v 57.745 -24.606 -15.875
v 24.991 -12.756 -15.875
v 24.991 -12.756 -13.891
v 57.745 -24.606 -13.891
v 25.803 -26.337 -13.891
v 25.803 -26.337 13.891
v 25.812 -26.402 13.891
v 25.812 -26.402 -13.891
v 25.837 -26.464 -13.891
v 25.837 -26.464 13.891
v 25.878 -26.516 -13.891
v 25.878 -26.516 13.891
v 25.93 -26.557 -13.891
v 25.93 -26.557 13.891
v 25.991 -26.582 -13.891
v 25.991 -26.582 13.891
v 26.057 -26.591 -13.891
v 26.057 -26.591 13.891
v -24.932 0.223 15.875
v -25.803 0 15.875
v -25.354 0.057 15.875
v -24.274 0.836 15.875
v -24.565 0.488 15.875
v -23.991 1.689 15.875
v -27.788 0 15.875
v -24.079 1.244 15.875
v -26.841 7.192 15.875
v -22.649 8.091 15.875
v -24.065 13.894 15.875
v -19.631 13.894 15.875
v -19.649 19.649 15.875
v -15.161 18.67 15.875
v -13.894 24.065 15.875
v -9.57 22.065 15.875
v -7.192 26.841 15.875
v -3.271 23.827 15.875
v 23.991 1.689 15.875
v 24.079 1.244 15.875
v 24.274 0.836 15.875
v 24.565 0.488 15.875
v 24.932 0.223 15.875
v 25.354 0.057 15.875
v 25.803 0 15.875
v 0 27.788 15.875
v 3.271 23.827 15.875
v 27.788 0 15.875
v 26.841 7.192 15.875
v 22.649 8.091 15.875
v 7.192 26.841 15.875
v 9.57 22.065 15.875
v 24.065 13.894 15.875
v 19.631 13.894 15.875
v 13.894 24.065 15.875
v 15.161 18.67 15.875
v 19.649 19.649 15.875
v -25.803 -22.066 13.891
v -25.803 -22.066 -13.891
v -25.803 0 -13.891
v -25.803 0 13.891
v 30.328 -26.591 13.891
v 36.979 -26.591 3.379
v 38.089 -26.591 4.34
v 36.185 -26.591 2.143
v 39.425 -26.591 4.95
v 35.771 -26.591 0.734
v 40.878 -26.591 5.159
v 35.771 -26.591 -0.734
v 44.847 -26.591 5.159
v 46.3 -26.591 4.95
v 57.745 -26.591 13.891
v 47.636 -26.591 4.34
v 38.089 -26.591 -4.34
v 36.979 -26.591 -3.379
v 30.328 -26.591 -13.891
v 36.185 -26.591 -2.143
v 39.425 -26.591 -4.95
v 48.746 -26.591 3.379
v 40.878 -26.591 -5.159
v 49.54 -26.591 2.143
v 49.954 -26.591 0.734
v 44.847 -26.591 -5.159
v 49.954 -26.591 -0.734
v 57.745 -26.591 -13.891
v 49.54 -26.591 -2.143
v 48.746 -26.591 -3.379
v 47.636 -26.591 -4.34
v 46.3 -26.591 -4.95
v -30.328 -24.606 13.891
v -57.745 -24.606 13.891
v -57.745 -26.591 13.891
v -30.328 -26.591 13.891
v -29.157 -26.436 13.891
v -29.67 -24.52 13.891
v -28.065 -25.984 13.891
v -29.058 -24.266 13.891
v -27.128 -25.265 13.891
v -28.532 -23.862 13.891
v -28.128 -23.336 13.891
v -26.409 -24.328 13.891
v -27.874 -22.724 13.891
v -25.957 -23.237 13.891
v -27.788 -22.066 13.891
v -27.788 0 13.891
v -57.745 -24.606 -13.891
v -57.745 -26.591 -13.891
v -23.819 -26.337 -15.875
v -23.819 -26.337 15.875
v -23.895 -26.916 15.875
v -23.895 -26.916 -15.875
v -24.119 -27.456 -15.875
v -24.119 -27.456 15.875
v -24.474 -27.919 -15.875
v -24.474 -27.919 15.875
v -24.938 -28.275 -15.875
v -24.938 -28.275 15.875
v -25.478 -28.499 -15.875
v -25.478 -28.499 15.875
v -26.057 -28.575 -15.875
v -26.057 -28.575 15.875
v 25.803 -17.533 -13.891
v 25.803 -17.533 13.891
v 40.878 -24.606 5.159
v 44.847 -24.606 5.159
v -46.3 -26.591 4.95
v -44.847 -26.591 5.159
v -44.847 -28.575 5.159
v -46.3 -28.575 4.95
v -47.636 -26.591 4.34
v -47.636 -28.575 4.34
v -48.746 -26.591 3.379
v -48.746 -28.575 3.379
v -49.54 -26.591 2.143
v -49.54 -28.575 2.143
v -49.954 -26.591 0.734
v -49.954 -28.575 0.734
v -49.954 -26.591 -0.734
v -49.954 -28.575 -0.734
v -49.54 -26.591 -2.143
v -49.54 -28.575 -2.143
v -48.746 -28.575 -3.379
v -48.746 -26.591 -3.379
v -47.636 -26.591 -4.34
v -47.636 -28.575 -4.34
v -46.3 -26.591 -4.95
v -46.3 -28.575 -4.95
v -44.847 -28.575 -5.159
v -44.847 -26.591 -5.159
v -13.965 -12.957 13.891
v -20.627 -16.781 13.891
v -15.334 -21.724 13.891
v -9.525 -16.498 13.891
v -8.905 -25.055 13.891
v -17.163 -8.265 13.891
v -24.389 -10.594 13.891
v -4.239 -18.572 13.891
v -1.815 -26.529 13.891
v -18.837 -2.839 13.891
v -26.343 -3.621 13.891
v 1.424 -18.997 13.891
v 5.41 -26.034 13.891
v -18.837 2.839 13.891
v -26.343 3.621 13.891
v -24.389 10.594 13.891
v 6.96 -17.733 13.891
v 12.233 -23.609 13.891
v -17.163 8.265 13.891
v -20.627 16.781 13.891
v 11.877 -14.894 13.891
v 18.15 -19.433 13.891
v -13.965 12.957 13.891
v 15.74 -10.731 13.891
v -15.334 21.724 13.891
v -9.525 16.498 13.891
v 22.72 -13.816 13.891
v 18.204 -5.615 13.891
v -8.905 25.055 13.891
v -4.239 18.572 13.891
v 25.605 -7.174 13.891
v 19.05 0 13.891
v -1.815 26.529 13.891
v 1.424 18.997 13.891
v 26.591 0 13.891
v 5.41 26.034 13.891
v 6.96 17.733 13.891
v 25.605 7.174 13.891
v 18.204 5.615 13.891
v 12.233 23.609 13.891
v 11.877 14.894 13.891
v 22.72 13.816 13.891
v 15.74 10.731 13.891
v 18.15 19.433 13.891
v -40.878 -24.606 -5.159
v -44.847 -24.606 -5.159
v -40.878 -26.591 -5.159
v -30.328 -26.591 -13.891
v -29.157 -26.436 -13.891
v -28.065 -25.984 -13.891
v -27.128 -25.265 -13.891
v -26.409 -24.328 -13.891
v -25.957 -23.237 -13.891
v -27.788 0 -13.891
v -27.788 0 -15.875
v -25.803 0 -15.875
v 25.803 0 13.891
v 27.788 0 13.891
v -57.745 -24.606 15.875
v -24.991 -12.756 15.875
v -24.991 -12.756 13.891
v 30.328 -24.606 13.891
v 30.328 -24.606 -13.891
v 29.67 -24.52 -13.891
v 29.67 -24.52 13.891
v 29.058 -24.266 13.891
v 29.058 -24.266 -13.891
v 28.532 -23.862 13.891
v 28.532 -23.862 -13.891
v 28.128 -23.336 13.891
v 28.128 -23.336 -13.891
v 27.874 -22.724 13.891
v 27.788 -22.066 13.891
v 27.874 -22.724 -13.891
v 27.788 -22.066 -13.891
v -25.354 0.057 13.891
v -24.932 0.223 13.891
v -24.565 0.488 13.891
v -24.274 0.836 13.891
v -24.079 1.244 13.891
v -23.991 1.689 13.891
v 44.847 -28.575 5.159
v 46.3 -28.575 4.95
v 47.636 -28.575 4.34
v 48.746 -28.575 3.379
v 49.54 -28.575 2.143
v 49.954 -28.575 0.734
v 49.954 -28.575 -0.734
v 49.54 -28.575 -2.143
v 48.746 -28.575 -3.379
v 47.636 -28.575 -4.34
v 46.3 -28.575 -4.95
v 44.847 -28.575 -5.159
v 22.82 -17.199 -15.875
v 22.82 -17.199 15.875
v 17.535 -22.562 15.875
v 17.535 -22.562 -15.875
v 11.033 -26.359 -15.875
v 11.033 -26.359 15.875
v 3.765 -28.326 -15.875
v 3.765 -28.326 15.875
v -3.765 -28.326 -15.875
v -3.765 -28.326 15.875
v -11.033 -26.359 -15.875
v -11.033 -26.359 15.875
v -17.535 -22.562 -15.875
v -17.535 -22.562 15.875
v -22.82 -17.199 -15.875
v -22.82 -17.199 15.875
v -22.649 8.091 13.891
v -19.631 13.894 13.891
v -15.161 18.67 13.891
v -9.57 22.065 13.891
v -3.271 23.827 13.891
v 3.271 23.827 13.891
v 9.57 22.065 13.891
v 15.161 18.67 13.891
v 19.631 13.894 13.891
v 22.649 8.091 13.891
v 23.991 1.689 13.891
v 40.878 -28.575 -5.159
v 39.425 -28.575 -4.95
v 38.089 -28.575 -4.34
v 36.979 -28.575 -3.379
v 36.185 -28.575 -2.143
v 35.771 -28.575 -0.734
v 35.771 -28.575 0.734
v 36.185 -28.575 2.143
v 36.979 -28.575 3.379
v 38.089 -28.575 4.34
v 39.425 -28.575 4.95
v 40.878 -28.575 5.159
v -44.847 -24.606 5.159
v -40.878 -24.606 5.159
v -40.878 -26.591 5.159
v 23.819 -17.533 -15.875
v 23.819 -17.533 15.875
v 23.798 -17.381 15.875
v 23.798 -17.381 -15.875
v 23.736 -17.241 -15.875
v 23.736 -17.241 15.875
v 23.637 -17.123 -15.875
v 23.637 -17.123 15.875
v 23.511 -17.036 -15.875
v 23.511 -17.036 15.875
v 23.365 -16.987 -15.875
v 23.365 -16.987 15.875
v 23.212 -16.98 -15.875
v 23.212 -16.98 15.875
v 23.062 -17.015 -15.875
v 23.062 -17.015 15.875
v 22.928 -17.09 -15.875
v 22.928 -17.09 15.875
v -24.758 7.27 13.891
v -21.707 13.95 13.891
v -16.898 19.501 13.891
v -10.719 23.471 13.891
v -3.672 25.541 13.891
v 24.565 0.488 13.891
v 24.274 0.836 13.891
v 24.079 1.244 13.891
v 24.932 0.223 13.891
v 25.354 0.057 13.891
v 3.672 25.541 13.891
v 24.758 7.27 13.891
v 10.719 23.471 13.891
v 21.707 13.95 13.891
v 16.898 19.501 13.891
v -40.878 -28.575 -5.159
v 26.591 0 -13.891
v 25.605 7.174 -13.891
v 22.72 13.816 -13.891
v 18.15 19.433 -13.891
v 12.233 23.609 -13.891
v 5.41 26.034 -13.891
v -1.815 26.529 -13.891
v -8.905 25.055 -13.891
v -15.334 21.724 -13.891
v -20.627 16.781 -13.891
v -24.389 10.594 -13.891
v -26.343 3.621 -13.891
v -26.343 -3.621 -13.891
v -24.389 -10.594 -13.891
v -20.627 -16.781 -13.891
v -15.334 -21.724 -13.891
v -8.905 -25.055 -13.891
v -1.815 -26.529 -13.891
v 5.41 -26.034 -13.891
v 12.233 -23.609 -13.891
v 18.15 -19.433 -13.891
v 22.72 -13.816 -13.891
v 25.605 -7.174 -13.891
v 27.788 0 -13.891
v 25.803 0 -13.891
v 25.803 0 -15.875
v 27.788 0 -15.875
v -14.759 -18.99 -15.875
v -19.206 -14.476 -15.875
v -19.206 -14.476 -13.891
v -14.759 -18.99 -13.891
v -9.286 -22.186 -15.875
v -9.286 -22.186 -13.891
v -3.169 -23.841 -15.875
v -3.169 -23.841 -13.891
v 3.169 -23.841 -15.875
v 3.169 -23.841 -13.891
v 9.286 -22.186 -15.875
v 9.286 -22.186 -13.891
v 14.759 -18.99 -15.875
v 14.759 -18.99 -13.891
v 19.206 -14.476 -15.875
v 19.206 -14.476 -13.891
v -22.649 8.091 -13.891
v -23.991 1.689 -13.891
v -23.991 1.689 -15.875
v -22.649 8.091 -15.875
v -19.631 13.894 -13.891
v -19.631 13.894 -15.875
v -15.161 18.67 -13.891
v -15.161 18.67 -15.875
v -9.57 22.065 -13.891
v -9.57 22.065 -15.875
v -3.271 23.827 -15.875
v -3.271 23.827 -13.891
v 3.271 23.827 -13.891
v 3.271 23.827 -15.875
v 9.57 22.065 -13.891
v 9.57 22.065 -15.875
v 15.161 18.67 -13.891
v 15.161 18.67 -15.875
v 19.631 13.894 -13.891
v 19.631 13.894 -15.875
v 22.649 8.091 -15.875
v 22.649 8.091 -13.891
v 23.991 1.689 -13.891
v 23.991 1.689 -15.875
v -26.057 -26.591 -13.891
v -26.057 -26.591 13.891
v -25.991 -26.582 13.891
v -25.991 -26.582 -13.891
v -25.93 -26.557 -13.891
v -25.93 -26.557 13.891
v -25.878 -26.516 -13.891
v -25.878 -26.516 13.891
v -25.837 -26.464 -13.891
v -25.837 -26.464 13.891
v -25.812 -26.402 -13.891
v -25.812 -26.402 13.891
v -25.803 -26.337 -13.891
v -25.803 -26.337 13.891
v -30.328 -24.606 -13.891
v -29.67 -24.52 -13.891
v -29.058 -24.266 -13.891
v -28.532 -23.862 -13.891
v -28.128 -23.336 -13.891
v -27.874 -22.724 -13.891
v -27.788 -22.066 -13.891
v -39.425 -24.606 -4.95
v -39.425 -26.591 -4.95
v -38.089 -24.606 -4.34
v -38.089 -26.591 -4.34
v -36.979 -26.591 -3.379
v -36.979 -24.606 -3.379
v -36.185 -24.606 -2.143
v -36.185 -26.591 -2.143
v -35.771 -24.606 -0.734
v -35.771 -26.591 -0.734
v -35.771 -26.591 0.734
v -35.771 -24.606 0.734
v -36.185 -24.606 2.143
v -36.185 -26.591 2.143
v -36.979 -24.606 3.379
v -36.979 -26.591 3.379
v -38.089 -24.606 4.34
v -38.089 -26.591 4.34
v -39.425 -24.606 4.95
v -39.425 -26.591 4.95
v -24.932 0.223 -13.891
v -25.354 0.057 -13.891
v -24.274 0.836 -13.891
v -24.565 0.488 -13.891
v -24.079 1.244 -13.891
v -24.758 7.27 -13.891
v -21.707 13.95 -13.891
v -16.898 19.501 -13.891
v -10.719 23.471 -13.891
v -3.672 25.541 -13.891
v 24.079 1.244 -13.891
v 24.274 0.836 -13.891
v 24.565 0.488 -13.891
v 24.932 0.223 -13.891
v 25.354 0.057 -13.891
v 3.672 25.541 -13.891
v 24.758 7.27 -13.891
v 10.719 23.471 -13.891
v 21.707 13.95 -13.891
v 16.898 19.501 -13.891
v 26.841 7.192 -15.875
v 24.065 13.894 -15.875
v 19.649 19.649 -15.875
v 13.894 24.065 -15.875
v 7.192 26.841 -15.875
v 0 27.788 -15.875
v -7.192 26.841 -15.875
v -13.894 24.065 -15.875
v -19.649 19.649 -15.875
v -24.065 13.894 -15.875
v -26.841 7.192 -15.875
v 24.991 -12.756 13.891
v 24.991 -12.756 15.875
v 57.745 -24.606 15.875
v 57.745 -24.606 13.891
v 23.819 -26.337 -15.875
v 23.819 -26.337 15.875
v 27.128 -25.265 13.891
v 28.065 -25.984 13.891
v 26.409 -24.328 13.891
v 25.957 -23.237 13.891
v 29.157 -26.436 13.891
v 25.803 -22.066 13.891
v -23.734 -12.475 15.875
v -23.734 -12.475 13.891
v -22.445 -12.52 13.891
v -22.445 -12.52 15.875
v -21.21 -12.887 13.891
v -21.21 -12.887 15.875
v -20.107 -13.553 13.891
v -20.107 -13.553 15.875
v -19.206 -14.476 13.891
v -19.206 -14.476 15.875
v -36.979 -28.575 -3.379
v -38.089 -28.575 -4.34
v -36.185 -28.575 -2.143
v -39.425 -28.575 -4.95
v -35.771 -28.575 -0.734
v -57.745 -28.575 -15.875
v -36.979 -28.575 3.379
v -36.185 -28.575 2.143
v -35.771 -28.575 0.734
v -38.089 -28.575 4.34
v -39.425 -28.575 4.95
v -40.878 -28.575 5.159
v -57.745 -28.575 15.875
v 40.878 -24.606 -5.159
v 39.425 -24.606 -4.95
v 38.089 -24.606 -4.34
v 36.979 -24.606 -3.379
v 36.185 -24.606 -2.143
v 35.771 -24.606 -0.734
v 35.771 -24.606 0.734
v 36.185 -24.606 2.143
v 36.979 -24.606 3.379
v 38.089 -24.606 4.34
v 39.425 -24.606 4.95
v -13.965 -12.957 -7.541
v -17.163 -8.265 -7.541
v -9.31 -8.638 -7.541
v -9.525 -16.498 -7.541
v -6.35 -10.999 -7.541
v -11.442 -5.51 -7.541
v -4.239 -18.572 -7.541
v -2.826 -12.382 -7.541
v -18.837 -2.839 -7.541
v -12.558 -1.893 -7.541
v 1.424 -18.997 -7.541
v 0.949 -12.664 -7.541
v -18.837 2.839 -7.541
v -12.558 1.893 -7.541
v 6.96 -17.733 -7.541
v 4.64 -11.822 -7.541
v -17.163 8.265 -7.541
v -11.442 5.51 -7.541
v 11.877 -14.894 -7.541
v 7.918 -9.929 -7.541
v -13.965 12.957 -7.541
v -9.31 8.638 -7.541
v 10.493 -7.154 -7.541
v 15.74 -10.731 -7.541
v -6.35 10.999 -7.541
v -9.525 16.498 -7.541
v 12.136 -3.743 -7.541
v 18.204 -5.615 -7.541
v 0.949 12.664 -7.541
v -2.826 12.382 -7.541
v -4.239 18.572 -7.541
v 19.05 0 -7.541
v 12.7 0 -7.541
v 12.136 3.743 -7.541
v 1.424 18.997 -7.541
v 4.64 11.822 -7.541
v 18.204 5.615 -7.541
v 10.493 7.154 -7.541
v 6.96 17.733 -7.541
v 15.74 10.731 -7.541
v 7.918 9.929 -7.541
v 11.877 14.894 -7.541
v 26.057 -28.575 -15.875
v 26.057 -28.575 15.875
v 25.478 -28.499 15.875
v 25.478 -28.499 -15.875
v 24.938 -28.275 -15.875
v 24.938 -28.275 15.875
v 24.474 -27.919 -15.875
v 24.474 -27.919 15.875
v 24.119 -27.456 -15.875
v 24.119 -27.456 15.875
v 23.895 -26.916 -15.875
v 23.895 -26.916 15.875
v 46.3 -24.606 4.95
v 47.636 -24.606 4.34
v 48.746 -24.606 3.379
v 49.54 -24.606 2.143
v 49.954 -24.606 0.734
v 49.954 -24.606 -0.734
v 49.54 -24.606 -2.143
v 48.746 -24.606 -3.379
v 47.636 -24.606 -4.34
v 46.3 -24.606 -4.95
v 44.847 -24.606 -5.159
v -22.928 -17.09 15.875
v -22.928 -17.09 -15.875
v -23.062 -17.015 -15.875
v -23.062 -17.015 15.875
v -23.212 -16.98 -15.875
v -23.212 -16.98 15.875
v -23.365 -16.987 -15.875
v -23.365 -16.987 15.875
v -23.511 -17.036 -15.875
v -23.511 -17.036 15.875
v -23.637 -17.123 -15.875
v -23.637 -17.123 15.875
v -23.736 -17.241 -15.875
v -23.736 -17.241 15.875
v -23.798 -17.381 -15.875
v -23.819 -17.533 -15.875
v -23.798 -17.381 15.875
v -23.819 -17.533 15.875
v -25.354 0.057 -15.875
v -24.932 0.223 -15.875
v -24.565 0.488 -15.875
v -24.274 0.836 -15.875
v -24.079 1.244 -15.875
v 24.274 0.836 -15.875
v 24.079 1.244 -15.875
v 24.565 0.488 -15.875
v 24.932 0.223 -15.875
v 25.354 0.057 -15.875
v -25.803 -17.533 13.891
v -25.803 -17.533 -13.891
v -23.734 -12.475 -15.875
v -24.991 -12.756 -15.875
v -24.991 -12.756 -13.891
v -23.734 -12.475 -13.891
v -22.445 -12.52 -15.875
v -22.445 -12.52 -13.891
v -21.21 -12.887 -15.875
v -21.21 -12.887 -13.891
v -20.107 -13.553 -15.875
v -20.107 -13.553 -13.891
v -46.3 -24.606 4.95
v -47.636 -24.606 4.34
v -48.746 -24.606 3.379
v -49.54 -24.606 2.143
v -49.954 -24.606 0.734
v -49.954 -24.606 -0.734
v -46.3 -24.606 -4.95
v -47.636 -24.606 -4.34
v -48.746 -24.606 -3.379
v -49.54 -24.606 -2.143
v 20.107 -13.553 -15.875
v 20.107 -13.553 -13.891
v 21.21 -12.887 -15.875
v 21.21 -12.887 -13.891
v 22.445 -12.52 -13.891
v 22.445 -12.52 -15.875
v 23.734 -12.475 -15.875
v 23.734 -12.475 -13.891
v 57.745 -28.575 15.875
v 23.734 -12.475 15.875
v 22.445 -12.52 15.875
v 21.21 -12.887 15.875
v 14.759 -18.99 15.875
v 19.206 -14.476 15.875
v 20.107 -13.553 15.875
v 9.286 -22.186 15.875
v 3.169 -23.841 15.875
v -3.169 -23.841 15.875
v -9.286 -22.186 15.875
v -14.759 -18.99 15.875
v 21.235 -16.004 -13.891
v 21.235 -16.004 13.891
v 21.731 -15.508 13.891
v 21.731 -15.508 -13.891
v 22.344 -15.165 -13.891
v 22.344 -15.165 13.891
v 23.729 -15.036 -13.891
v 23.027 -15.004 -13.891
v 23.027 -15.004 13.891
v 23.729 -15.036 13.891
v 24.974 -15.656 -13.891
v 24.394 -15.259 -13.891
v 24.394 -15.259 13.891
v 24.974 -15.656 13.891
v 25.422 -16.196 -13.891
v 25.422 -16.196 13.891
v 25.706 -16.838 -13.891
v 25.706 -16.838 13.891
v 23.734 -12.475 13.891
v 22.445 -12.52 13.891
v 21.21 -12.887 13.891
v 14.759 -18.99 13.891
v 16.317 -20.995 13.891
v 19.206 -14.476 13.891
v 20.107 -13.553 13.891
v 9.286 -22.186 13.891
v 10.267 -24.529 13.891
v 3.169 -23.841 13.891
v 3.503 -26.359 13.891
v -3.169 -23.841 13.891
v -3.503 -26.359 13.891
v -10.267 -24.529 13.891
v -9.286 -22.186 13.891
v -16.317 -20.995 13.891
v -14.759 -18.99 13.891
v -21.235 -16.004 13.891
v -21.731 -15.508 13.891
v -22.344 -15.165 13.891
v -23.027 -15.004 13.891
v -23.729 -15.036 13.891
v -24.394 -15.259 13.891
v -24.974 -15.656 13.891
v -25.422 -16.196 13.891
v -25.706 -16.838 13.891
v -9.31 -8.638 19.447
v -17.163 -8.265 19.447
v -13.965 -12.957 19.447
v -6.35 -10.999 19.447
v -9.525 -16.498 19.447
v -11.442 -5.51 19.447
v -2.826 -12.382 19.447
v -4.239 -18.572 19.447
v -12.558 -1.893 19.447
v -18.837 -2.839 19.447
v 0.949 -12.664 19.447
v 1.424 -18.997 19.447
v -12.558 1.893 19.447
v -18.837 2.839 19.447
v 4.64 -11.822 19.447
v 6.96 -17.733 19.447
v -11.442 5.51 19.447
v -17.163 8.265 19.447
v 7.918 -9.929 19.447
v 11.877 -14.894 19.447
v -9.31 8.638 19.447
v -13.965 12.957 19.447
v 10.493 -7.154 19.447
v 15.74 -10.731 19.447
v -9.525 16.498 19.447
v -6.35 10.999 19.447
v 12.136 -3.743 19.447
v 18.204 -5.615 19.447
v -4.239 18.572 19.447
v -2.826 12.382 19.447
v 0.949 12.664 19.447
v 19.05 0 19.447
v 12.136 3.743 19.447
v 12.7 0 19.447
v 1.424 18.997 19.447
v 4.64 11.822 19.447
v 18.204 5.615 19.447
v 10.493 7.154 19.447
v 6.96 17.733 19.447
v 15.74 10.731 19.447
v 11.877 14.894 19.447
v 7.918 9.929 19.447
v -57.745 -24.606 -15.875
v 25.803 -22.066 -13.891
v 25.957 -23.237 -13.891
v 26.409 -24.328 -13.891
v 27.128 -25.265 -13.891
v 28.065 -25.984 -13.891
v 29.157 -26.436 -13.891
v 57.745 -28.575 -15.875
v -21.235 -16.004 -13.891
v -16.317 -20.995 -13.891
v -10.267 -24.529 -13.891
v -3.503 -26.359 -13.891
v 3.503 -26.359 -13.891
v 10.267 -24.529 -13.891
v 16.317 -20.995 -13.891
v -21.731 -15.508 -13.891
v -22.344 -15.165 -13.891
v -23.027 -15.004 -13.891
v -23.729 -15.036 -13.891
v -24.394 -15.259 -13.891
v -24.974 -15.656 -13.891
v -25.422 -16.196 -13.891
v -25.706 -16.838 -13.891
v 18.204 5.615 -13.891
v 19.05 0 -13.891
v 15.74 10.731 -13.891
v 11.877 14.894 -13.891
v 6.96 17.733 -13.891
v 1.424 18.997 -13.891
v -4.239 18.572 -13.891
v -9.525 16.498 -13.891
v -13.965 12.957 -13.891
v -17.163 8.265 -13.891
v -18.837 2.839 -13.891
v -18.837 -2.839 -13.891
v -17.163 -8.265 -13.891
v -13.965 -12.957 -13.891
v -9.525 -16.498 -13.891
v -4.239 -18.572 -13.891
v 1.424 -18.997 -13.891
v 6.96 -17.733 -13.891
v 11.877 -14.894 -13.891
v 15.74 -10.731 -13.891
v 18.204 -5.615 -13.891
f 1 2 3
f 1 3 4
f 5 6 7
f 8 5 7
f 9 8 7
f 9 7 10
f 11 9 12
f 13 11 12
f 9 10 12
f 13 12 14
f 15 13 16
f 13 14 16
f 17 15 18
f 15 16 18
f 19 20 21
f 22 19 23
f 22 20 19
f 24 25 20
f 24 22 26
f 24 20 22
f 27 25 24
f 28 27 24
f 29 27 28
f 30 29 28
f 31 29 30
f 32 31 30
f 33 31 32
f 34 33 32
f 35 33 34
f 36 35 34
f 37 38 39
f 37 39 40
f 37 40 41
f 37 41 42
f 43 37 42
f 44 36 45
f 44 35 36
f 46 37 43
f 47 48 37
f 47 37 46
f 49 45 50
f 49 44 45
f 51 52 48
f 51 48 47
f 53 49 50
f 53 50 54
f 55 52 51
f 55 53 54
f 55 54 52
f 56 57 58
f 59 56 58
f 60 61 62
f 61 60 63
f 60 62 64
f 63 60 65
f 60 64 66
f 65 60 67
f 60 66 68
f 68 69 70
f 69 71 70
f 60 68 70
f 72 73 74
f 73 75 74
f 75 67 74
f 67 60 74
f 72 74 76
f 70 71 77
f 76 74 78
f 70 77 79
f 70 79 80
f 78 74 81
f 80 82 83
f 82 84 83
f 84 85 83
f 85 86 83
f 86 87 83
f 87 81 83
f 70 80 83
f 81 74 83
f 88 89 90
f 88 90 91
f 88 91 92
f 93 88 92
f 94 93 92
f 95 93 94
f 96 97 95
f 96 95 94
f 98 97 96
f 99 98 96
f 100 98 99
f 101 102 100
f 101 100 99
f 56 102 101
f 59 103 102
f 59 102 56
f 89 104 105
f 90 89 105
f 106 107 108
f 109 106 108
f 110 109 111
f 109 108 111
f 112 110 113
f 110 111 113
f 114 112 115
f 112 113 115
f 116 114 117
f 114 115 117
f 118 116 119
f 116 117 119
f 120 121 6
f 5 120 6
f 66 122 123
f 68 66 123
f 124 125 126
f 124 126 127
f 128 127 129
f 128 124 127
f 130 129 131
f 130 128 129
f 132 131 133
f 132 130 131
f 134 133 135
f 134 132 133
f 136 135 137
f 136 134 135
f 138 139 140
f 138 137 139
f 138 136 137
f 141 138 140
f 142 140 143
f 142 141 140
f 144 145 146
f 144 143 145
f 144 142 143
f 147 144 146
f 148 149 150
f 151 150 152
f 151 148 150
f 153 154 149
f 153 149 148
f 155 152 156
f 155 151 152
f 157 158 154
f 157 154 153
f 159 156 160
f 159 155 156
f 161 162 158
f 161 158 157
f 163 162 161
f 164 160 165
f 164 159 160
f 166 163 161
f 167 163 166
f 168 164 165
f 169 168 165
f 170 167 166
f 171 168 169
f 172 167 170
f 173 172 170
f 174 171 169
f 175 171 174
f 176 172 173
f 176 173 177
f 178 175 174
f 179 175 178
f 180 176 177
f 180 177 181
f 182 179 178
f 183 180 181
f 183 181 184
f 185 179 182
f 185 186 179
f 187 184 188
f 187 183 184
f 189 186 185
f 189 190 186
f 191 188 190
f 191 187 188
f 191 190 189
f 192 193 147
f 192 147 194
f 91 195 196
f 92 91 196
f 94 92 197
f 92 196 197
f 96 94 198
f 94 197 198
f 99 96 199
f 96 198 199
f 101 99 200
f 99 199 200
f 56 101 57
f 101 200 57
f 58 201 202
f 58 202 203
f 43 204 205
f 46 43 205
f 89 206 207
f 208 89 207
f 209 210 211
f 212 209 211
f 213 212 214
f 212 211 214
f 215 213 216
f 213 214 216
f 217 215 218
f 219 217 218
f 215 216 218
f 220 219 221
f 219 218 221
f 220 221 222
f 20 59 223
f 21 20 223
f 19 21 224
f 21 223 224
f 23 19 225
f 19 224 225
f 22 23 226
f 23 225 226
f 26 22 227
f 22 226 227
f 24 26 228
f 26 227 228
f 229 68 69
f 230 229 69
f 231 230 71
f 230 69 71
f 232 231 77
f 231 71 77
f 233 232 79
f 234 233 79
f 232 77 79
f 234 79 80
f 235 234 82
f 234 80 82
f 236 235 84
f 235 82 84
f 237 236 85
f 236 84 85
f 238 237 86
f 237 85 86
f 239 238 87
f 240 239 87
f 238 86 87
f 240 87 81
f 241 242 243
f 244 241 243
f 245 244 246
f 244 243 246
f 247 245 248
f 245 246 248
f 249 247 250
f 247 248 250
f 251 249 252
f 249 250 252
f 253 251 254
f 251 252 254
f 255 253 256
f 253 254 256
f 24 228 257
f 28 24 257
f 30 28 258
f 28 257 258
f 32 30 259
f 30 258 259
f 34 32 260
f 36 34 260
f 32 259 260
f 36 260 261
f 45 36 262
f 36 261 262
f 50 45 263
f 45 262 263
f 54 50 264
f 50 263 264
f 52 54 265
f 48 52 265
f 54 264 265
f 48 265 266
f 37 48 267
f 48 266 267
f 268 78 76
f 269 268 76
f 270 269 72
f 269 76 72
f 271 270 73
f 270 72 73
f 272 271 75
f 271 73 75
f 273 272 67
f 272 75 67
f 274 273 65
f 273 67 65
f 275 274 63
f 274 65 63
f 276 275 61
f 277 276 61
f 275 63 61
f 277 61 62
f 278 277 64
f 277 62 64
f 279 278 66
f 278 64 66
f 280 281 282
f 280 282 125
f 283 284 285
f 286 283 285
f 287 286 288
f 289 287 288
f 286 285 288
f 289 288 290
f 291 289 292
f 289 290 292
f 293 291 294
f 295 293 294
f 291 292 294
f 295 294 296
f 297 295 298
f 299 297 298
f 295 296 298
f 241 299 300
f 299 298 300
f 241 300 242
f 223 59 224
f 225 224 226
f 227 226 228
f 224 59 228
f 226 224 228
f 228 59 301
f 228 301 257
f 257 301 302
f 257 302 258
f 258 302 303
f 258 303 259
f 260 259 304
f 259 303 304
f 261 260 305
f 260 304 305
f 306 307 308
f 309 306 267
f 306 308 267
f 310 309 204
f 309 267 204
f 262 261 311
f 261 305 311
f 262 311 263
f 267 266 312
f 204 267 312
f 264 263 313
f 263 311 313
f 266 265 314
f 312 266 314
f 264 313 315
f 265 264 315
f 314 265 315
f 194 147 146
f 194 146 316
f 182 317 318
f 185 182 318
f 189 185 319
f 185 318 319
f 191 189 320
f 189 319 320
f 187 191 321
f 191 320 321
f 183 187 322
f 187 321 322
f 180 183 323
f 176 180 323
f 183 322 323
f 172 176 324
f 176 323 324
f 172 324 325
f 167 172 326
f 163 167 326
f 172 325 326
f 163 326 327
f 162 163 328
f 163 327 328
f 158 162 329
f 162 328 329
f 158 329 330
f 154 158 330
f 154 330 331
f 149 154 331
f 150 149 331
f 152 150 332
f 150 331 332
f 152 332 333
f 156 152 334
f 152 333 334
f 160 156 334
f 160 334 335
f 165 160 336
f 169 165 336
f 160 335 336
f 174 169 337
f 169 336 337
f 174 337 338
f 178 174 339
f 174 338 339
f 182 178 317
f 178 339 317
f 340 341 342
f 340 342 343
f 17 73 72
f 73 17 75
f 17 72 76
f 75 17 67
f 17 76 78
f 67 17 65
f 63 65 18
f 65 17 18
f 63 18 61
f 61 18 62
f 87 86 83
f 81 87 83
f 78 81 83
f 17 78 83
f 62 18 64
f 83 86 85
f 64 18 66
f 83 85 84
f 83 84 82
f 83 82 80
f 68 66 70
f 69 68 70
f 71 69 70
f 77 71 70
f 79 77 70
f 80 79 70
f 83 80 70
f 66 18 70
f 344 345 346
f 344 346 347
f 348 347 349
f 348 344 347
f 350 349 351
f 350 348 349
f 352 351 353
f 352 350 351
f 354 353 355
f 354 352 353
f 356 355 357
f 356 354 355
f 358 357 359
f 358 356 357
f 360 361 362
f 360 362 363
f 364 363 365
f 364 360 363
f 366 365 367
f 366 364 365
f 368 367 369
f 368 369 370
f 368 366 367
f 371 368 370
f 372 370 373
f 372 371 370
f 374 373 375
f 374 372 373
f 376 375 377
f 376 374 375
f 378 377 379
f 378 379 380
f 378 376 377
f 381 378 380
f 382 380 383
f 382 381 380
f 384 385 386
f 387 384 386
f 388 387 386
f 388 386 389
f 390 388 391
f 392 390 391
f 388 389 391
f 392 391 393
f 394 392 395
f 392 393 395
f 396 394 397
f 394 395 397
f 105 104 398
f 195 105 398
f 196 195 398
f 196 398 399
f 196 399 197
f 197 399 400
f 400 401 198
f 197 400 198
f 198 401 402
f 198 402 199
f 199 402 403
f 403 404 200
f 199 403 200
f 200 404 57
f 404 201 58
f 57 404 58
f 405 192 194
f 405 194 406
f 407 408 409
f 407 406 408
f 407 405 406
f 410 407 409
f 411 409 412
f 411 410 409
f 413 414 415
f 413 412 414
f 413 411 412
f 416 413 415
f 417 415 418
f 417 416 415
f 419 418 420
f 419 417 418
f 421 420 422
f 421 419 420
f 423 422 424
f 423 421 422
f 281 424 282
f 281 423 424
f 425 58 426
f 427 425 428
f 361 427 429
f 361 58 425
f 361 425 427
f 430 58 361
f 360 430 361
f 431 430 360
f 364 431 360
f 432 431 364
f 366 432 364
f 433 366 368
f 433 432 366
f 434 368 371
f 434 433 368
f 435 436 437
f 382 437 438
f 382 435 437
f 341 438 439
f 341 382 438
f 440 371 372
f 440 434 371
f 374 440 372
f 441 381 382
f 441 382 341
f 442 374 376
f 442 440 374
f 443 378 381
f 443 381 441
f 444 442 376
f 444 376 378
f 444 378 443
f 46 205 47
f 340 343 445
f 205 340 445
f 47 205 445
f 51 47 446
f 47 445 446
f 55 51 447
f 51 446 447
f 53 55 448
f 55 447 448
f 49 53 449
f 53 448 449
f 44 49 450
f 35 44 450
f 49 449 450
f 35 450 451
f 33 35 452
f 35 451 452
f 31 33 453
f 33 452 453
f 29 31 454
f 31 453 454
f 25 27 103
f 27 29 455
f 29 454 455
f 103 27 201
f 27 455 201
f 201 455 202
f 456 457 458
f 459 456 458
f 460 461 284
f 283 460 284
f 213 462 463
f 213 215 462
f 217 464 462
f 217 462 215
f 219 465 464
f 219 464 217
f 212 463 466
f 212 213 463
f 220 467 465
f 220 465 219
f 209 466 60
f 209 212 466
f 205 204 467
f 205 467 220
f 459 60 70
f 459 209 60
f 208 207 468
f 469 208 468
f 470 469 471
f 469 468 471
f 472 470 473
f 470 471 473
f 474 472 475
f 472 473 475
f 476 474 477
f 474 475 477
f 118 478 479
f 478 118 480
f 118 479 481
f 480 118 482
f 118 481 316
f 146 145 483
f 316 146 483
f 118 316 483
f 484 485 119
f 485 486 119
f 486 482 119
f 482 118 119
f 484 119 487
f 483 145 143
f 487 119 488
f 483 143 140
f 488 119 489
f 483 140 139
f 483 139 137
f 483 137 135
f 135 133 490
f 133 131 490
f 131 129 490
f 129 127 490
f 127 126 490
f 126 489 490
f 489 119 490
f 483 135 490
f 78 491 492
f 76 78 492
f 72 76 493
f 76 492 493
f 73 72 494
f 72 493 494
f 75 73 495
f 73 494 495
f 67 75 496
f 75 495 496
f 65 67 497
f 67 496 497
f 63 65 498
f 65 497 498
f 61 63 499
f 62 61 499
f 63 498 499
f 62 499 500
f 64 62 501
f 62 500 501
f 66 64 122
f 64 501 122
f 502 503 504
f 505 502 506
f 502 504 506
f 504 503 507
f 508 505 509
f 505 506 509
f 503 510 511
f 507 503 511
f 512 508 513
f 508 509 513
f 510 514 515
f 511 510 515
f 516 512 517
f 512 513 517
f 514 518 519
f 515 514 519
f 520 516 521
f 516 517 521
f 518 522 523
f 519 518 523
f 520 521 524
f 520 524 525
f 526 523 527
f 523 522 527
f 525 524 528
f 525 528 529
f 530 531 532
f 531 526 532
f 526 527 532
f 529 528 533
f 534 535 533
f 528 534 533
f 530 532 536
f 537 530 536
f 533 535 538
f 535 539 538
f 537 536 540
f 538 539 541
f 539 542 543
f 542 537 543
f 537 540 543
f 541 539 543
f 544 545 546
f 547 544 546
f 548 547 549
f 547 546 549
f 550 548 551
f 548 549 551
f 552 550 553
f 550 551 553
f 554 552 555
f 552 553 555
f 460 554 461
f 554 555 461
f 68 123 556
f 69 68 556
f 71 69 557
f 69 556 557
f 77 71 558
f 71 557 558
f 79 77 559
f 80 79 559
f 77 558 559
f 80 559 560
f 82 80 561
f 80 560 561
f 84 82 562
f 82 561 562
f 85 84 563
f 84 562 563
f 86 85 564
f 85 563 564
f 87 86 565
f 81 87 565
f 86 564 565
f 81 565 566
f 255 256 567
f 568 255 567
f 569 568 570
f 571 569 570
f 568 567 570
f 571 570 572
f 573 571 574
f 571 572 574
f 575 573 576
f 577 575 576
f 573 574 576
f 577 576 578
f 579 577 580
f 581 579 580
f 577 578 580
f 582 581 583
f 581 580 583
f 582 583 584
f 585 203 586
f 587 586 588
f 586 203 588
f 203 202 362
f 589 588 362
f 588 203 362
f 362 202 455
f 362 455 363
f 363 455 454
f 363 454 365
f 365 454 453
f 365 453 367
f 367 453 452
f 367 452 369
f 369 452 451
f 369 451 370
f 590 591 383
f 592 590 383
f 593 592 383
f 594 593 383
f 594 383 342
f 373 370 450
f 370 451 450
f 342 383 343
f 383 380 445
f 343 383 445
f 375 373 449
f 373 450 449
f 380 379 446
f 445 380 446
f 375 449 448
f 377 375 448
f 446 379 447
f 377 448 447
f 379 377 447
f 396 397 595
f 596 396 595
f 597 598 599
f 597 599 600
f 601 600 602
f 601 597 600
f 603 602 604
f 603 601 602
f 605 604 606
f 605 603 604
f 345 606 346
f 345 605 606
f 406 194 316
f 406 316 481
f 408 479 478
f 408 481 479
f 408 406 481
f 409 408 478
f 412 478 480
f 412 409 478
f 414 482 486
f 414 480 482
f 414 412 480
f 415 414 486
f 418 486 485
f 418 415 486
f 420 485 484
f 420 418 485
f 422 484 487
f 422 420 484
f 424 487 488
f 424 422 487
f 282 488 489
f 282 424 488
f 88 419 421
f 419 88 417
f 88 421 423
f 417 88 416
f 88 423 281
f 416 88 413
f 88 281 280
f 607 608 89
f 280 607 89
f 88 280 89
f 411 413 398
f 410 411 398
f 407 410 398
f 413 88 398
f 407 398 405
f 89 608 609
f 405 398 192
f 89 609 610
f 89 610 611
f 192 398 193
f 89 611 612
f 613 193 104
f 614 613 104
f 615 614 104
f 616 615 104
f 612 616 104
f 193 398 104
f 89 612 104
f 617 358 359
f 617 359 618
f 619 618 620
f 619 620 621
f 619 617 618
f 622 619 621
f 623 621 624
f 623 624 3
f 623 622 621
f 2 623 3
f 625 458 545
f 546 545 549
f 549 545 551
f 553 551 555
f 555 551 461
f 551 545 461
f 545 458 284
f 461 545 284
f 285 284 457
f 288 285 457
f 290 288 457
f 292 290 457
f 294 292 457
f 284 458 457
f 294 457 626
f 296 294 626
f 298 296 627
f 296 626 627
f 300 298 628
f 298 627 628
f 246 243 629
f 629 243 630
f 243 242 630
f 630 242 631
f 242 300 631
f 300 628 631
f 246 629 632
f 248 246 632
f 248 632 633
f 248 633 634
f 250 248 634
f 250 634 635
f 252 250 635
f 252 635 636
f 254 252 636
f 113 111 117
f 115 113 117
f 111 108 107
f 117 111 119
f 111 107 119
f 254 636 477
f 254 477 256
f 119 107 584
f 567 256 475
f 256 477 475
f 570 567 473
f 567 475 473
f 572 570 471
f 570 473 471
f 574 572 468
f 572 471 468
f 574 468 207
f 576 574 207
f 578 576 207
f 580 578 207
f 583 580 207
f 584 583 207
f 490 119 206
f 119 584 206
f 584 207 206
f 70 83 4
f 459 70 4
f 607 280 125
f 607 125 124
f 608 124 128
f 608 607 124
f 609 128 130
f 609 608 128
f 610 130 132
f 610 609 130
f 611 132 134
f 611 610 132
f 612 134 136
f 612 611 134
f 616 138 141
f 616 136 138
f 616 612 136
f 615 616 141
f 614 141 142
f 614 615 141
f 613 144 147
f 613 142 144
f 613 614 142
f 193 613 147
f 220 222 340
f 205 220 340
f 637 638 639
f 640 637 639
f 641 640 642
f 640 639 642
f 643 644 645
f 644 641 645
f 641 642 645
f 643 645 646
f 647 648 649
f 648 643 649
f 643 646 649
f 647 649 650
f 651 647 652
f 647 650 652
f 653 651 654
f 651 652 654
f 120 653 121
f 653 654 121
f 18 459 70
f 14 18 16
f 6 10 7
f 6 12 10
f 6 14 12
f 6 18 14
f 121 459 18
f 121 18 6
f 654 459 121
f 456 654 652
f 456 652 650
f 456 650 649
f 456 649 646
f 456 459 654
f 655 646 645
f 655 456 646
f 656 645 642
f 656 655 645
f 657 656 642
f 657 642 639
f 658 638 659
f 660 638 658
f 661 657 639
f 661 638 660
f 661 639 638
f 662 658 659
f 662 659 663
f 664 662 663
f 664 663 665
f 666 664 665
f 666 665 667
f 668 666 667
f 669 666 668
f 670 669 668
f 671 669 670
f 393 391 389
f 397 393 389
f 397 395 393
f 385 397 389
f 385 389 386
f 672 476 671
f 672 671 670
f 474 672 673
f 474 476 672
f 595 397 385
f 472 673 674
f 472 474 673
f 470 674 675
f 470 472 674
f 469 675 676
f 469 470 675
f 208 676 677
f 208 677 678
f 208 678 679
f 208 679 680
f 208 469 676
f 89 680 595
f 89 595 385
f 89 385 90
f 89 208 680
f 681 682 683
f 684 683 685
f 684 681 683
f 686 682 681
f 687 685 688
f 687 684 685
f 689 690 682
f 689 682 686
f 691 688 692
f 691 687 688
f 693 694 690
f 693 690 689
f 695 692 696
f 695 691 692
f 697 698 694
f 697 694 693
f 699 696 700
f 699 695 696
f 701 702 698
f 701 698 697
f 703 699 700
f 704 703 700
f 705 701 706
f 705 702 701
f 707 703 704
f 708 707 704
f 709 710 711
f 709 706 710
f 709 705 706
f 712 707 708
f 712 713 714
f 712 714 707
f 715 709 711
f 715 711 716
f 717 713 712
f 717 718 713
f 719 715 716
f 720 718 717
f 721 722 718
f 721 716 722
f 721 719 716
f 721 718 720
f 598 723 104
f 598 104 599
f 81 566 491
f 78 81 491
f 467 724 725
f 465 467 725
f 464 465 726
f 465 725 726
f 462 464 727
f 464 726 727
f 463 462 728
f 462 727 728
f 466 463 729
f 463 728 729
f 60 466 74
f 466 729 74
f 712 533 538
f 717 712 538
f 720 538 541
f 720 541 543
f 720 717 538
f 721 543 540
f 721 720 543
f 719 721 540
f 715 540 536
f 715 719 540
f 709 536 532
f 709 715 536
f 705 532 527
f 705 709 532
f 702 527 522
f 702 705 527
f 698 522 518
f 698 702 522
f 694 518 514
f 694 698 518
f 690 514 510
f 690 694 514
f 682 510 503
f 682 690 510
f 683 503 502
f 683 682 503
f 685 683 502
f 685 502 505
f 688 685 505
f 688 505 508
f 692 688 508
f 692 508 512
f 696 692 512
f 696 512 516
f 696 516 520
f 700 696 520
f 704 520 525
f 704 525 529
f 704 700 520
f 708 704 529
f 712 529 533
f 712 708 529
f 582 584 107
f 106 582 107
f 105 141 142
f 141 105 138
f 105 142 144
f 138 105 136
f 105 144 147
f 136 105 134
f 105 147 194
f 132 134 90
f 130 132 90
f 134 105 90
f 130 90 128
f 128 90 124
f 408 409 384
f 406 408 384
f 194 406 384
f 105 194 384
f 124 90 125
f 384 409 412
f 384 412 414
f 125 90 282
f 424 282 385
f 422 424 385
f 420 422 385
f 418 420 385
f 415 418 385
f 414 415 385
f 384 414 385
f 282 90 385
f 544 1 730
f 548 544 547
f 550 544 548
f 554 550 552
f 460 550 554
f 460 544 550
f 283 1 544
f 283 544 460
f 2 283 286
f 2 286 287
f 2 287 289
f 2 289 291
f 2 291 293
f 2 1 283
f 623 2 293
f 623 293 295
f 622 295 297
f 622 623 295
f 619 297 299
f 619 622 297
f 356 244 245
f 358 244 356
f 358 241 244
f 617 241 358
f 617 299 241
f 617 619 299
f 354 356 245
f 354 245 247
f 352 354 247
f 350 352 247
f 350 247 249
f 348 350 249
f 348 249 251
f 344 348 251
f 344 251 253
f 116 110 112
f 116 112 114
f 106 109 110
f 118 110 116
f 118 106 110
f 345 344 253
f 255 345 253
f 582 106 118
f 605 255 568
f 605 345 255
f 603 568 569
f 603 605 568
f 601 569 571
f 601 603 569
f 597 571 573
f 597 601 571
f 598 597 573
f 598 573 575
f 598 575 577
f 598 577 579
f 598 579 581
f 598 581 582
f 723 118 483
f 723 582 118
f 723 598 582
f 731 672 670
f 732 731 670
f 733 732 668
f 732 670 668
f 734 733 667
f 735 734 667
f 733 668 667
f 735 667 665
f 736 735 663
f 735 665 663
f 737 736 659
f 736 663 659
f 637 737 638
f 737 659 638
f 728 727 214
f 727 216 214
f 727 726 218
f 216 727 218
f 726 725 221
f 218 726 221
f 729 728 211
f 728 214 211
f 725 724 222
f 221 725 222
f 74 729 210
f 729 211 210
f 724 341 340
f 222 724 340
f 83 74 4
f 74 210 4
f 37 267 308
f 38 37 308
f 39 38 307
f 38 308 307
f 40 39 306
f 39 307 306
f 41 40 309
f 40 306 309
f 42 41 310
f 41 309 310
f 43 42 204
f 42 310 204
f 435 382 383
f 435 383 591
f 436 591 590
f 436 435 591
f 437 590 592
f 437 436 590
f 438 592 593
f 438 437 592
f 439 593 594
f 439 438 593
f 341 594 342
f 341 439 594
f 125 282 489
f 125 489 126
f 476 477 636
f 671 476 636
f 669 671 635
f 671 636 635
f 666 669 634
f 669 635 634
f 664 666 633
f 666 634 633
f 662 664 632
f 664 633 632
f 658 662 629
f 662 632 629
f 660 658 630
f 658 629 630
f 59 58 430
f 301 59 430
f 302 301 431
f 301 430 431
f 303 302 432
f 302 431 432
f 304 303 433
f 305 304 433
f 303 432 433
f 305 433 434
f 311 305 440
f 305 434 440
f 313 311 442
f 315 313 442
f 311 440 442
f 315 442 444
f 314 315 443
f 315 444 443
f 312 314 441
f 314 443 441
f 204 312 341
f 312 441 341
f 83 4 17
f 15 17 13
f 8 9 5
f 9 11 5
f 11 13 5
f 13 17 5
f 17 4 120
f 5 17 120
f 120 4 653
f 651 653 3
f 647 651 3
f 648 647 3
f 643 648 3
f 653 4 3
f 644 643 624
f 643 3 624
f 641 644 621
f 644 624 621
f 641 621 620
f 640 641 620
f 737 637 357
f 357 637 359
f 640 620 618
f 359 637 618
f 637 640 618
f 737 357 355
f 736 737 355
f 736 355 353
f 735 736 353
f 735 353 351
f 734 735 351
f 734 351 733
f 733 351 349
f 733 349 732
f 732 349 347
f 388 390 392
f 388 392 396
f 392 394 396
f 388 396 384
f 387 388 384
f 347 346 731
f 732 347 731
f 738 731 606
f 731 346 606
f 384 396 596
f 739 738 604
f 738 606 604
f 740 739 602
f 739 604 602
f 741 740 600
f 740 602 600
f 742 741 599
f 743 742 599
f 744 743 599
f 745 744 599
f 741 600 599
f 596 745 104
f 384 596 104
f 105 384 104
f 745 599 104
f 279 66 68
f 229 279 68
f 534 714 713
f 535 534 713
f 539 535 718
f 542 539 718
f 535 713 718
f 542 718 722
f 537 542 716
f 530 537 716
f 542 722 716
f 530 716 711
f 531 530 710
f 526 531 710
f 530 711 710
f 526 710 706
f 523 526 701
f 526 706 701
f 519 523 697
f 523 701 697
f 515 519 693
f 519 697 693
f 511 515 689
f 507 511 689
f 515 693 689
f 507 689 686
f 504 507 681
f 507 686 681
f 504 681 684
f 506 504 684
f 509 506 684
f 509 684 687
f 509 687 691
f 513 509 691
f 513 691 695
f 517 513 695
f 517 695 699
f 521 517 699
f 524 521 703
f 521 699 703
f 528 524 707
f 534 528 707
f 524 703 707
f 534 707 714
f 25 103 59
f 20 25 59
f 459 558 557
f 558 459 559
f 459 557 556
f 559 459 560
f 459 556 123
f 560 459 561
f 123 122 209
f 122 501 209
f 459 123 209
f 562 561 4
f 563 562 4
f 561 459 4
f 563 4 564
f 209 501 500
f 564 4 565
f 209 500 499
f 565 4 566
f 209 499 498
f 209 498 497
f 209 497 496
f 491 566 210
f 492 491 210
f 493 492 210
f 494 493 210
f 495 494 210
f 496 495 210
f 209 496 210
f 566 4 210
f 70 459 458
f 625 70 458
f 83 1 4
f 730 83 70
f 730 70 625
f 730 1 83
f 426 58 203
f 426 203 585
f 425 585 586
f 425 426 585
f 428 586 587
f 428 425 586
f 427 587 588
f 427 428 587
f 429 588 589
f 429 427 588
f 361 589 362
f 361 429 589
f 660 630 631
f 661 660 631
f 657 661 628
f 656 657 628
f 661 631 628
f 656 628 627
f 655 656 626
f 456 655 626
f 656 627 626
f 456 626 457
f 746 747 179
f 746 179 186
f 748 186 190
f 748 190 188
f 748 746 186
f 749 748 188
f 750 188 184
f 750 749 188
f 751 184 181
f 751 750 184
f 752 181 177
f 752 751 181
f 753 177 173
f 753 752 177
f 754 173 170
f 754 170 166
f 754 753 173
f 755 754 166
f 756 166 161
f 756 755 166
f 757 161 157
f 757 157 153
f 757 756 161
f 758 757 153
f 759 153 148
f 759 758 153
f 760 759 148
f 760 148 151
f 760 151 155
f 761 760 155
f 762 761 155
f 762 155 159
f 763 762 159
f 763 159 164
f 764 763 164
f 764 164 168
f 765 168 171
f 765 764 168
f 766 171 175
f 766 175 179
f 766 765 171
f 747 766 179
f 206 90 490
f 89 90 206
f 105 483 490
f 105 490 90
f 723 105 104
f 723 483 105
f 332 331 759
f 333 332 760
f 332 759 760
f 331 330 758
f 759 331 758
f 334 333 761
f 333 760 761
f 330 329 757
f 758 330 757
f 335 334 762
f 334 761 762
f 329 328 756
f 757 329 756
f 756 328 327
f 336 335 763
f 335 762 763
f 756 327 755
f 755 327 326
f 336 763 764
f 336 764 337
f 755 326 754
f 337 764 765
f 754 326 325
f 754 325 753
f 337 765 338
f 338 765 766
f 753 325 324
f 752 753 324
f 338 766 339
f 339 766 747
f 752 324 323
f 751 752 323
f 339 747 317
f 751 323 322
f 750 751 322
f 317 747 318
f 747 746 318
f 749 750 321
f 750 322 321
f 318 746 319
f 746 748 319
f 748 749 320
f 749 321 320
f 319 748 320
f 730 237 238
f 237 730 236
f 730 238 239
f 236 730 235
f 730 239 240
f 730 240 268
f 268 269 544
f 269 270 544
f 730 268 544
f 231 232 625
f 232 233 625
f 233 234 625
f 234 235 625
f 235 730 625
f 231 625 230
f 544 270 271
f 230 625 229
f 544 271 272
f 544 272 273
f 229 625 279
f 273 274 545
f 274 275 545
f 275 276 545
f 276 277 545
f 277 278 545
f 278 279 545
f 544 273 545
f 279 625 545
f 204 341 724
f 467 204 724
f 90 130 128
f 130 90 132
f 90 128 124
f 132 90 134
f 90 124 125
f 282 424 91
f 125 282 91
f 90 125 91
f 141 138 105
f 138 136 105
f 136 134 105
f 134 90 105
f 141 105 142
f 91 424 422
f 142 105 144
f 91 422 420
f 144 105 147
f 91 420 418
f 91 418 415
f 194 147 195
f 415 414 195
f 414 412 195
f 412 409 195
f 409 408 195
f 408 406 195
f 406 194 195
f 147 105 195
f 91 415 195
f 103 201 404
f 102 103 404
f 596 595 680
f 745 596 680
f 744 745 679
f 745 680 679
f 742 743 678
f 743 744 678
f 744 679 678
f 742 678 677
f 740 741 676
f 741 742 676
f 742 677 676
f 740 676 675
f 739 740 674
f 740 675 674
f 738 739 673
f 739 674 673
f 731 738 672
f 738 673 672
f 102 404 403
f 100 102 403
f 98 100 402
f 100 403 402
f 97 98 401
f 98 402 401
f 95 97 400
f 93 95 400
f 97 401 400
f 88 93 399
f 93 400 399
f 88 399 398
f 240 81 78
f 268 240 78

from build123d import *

# Parameters (mm, degrees)
EXTRUDE_THIN2_DEPTH      = 15.875
EXTRUDE1_DEPTH           = 1.984375
EXTRUDE_THIN3_DEPTH      = 13.890625
EXTRUDE_THIN3_DEPTH_BACK = 13.890625
EXTRUDE2_DEPTH           = 1.984375
EXTRUDE3_START           = -13.890625
EXTRUDE3_OUTLINE_R       = 26.590625
EXTRUDE3_OUTLINE_R_2     = 19.05
EXTRUDE3_DEPTH           = 27.78125
SKETCH8_R                = 19.05
SKETCH8_R_2              = 12.7
EXTRUDE4_DEPTH           = 26.9875
CUT_EXTRUDE1_DEPTH       = 68.299574204


# Read off the part's stored shape, not the designer's step: Extrude3
with BuildPart() as part:
    # Sketch1 → Extrude-Thin2 (new, symmetric)
    with BuildSketch(Plane.XY):
        with BuildLine():
            Line((-57.7453125, -26.590625), (-26.057225, -26.590625))
            ThreePointArc((-26.057225, -26.590625), (-25.877619878, -26.516230122), (-25.803225, -26.336625))
            Line((-25.803225, -26.336625), (-25.803225, -17.533273382))
            ThreePointArc((-25.803225, -17.533273382), (-24.069283693, -15.124566388), (-21.23482391, -16.004486602))
            ThreePointArc((-21.23482391, -16.004486602), (0, -26.590625), (21.23482391, -16.004486602))
            ThreePointArc((21.23482391, -16.004486602), (24.069283693, -15.124566388), (25.803225, -17.533273382))
            Line((25.803225, -17.533273382), (25.803225, -26.336625))
            ThreePointArc((25.803225, -26.336625), (25.877619878, -26.516230122), (26.057225, -26.590625))
            Line((26.057225, -26.590625), (57.7453125, -26.590625))
            Line((57.7453125, -26.590625), (57.7453125, -28.575))
            Line((57.7453125, -28.575), (26.057225, -28.575))
            ThreePointArc((26.057225, -28.575), (24.474454859, -27.919395141), (23.81885, -26.336625))
            Line((23.81885, -26.336625), (23.81885, -17.533273382))
            ThreePointArc((23.81885, -17.533273382), (23.439550339, -17.006368727), (22.819512262, -17.198851274))
            ThreePointArc((22.819512262, -17.198851274), (0, -28.575), (-22.819512262, -17.198851274))
            ThreePointArc((-22.819512262, -17.198851274), (-23.439550339, -17.006368727), (-23.81885, -17.533273382))
            Line((-23.81885, -17.533273382), (-23.81885, -26.336625))
            ThreePointArc((-23.81885, -26.336625), (-24.474454859, -27.919395141), (-26.057225, -28.575))
            Line((-26.057225, -28.575), (-57.7453125, -28.575))
            Line((-57.7453125, -28.575), (-57.7453125, -26.590625))
        make_face()
    extrude(amount=EXTRUDE_THIN2_DEPTH, both=True)

    # Sketch4 → Extrude1 (add)
    with BuildSketch(Plane.XY.offset(15.875)):
        with BuildLine():
            Line((-57.7453125, -24.60625), (-24.991480683, -12.756293971))
            ThreePointArc((-24.991480683, -12.756293971), (-21.815944337, -12.663799213), (-19.20642282, -14.475699822))
            ThreePointArc((-19.20642282, -14.475699822), (0, -24.050625), (19.20642282, -14.475699822))
            ThreePointArc((19.20642282, -14.475699822), (21.815944337, -12.663799213), (24.991480683, -12.756293971))
            Line((24.991480683, -12.756293971), (57.7453125, -24.60625))
            Line((57.7453125, -24.60625), (57.7453125, -28.575))
            Line((57.7453125, -28.575), (26.057225, -28.575))
            ThreePointArc((26.057225, -28.575), (24.474454859, -27.919395141), (23.81885, -26.336625))
            Line((23.81885, -26.336625), (23.81885, -17.533273382))
            ThreePointArc((23.81885, -17.533273382), (23.439550339, -17.006368727), (22.819512262, -17.198851274))
            ThreePointArc((22.819512262, -17.198851274), (0, -28.575), (-22.819512262, -17.198851274))
            ThreePointArc((-22.819512262, -17.198851274), (-23.439550339, -17.006368727), (-23.81885, -17.533273382))
            Line((-23.81885, -17.533273382), (-23.81885, -26.336625))
            ThreePointArc((-23.81885, -26.336625), (-24.474454859, -27.919395141), (-26.057225, -28.575))
            Line((-26.057225, -28.575), (-57.7453125, -28.575))
            Line((-57.7453125, -28.575), (-57.7453125, -24.60625))
        make_face()
    extrude1 = extrude(amount=-EXTRUDE1_DEPTH)

    # Mirror1: Extrude1 across plane
    add(extrude1.mirror(Plane.XY))


with BuildPart() as body_2:
    # Sketch5 → Extrude-Thin3 (new, two sides: drawn at the far end of the back side and taken through both)
    with BuildSketch(Plane.XY.offset(-EXTRUDE_THIN3_DEPTH_BACK)):
        with BuildLine():
            Line((57.7453125, -24.60625), (30.3276, -24.60625))
            ThreePointArc((30.3276, -24.60625), (28.531548776, -23.862301224), (27.7876, -22.06625))
            Line((27.7876, -22.06625), (27.7876, 0))
            ThreePointArc((27.7876, 0), (0, 27.7876), (-27.7876, 0))
            Line((-27.7876, 0), (-27.7876, -22.06625))
            ThreePointArc((-27.7876, -22.06625), (-28.531548776, -23.862301224), (-30.3276, -24.60625))
            Line((-30.3276, -24.60625), (-57.7453125, -24.60625))
            Line((-57.7453125, -24.60625), (-57.7453125, -26.590625))
            Line((-57.7453125, -26.590625), (-30.3276, -26.590625))
            ThreePointArc((-30.3276, -26.590625), (-27.128383757, -25.265466243), (-25.803225, -22.06625))
            Line((-25.803225, -22.06625), (-25.803225, 0))
            ThreePointArc((-25.803225, 0), (0, 25.803225), (25.803225, 0))
            Line((25.803225, 0), (25.803225, -22.06625))
            ThreePointArc((25.803225, -22.06625), (27.128383757, -25.265466243), (30.3276, -26.590625))
            Line((30.3276, -26.590625), (57.7453125, -26.590625))
            Line((57.7453125, -26.590625), (57.7453125, -24.60625))
        make_face()
    extrude(amount=EXTRUDE_THIN3_DEPTH + EXTRUDE_THIN3_DEPTH_BACK)

    # Sketch6 → Extrude2 (add)
    with BuildSketch(Plane(origin=(0, 0, -13.890625), x_dir=(-1, 0, 0), z_dir=(0, 0, -1))):
        with BuildLine():
            Line((-25.803225, 0), (-27.7876, 0))
            ThreePointArc((-27.7876, 0), (0, 27.7876), (27.7876, 0))
            Line((27.7876, 0), (25.803225, 0))
            ThreePointArc((25.803225, 0), (24.56471473, 0.487695001), (23.991252112, 1.688900533))
            ThreePointArc((23.991252112, 1.688900533), (0, 24.050625), (-23.991252112, 1.688900533))
            ThreePointArc((-23.991252112, 1.688900533), (-24.56471473, 0.487695001), (-25.803225, 0))
        make_face()
    extrude2 = extrude(amount=EXTRUDE2_DEPTH)

    # Mirror2: Extrude2 across plane
    add(extrude2.mirror(Plane.XY))


with BuildPart() as body_3:
    # Extrude3 outline → Extrude3 (new body)
    with BuildSketch(Plane.XY.offset(EXTRUDE3_START)):
        Circle(EXTRUDE3_OUTLINE_R)
        Circle(EXTRUDE3_OUTLINE_R_2, mode=Mode.SUBTRACT)
    extrude(amount=EXTRUDE3_DEPTH)


with BuildPart() as body_4:
    # Sketch8 → Extrude4 (new body)
    with BuildSketch(Plane.XY.offset(19.446875)):
        Circle(SKETCH8_R)
        Circle(SKETCH8_R_2, mode=Mode.SUBTRACT)
    extrude(amount=-EXTRUDE4_DEPTH)


with BuildPart() as cut_extrude1_tool:
    # Sketch3 → Cut-Extrude1 (new, through all)
    with BuildSketch(Plane(origin=(0, 0, 0), x_dir=(1, 0, 0), z_dir=(0, 1, 0))):
        with BuildLine():
            Line((-44.846875, 5.159375), (-40.878125, 5.159375))
            ThreePointArc((-40.878125, 5.159375), (-35.71875, 0), (-40.878125, -5.159375))
            Line((-40.878125, -5.159375), (-44.846875, -5.159375))
            ThreePointArc((-44.846875, -5.159375), (-50.00625, 0), (-44.846875, 5.159375))
        make_face()
        with BuildLine():
            Line((40.878125, -5.159375), (44.846875, -5.159375))
            ThreePointArc((44.846875, -5.159375), (50.00625, 0), (44.846875, 5.159375))
            Line((44.846875, 5.159375), (40.878125, 5.159375))
            ThreePointArc((40.878125, 5.159375), (35.71875, 0), (40.878125, -5.159375))
        make_face()
    extrude(amount=-CUT_EXTRUDE1_DEPTH)


with BuildPart() as part_1:
    add(part.part)

    # Cut-Extrude1: cut by cut_extrude1_tool
    add(cut_extrude1_tool.part, mode=Mode.SUBTRACT)


with BuildPart() as body_2_1:
    add(body_2.part)

    # Cut-Extrude1: cut by cut_extrude1_tool
    add(cut_extrude1_tool.part, mode=Mode.SUBTRACT)


solid = Compound([body_3.part, body_4.part, part_1.part, body_2_1.part])
